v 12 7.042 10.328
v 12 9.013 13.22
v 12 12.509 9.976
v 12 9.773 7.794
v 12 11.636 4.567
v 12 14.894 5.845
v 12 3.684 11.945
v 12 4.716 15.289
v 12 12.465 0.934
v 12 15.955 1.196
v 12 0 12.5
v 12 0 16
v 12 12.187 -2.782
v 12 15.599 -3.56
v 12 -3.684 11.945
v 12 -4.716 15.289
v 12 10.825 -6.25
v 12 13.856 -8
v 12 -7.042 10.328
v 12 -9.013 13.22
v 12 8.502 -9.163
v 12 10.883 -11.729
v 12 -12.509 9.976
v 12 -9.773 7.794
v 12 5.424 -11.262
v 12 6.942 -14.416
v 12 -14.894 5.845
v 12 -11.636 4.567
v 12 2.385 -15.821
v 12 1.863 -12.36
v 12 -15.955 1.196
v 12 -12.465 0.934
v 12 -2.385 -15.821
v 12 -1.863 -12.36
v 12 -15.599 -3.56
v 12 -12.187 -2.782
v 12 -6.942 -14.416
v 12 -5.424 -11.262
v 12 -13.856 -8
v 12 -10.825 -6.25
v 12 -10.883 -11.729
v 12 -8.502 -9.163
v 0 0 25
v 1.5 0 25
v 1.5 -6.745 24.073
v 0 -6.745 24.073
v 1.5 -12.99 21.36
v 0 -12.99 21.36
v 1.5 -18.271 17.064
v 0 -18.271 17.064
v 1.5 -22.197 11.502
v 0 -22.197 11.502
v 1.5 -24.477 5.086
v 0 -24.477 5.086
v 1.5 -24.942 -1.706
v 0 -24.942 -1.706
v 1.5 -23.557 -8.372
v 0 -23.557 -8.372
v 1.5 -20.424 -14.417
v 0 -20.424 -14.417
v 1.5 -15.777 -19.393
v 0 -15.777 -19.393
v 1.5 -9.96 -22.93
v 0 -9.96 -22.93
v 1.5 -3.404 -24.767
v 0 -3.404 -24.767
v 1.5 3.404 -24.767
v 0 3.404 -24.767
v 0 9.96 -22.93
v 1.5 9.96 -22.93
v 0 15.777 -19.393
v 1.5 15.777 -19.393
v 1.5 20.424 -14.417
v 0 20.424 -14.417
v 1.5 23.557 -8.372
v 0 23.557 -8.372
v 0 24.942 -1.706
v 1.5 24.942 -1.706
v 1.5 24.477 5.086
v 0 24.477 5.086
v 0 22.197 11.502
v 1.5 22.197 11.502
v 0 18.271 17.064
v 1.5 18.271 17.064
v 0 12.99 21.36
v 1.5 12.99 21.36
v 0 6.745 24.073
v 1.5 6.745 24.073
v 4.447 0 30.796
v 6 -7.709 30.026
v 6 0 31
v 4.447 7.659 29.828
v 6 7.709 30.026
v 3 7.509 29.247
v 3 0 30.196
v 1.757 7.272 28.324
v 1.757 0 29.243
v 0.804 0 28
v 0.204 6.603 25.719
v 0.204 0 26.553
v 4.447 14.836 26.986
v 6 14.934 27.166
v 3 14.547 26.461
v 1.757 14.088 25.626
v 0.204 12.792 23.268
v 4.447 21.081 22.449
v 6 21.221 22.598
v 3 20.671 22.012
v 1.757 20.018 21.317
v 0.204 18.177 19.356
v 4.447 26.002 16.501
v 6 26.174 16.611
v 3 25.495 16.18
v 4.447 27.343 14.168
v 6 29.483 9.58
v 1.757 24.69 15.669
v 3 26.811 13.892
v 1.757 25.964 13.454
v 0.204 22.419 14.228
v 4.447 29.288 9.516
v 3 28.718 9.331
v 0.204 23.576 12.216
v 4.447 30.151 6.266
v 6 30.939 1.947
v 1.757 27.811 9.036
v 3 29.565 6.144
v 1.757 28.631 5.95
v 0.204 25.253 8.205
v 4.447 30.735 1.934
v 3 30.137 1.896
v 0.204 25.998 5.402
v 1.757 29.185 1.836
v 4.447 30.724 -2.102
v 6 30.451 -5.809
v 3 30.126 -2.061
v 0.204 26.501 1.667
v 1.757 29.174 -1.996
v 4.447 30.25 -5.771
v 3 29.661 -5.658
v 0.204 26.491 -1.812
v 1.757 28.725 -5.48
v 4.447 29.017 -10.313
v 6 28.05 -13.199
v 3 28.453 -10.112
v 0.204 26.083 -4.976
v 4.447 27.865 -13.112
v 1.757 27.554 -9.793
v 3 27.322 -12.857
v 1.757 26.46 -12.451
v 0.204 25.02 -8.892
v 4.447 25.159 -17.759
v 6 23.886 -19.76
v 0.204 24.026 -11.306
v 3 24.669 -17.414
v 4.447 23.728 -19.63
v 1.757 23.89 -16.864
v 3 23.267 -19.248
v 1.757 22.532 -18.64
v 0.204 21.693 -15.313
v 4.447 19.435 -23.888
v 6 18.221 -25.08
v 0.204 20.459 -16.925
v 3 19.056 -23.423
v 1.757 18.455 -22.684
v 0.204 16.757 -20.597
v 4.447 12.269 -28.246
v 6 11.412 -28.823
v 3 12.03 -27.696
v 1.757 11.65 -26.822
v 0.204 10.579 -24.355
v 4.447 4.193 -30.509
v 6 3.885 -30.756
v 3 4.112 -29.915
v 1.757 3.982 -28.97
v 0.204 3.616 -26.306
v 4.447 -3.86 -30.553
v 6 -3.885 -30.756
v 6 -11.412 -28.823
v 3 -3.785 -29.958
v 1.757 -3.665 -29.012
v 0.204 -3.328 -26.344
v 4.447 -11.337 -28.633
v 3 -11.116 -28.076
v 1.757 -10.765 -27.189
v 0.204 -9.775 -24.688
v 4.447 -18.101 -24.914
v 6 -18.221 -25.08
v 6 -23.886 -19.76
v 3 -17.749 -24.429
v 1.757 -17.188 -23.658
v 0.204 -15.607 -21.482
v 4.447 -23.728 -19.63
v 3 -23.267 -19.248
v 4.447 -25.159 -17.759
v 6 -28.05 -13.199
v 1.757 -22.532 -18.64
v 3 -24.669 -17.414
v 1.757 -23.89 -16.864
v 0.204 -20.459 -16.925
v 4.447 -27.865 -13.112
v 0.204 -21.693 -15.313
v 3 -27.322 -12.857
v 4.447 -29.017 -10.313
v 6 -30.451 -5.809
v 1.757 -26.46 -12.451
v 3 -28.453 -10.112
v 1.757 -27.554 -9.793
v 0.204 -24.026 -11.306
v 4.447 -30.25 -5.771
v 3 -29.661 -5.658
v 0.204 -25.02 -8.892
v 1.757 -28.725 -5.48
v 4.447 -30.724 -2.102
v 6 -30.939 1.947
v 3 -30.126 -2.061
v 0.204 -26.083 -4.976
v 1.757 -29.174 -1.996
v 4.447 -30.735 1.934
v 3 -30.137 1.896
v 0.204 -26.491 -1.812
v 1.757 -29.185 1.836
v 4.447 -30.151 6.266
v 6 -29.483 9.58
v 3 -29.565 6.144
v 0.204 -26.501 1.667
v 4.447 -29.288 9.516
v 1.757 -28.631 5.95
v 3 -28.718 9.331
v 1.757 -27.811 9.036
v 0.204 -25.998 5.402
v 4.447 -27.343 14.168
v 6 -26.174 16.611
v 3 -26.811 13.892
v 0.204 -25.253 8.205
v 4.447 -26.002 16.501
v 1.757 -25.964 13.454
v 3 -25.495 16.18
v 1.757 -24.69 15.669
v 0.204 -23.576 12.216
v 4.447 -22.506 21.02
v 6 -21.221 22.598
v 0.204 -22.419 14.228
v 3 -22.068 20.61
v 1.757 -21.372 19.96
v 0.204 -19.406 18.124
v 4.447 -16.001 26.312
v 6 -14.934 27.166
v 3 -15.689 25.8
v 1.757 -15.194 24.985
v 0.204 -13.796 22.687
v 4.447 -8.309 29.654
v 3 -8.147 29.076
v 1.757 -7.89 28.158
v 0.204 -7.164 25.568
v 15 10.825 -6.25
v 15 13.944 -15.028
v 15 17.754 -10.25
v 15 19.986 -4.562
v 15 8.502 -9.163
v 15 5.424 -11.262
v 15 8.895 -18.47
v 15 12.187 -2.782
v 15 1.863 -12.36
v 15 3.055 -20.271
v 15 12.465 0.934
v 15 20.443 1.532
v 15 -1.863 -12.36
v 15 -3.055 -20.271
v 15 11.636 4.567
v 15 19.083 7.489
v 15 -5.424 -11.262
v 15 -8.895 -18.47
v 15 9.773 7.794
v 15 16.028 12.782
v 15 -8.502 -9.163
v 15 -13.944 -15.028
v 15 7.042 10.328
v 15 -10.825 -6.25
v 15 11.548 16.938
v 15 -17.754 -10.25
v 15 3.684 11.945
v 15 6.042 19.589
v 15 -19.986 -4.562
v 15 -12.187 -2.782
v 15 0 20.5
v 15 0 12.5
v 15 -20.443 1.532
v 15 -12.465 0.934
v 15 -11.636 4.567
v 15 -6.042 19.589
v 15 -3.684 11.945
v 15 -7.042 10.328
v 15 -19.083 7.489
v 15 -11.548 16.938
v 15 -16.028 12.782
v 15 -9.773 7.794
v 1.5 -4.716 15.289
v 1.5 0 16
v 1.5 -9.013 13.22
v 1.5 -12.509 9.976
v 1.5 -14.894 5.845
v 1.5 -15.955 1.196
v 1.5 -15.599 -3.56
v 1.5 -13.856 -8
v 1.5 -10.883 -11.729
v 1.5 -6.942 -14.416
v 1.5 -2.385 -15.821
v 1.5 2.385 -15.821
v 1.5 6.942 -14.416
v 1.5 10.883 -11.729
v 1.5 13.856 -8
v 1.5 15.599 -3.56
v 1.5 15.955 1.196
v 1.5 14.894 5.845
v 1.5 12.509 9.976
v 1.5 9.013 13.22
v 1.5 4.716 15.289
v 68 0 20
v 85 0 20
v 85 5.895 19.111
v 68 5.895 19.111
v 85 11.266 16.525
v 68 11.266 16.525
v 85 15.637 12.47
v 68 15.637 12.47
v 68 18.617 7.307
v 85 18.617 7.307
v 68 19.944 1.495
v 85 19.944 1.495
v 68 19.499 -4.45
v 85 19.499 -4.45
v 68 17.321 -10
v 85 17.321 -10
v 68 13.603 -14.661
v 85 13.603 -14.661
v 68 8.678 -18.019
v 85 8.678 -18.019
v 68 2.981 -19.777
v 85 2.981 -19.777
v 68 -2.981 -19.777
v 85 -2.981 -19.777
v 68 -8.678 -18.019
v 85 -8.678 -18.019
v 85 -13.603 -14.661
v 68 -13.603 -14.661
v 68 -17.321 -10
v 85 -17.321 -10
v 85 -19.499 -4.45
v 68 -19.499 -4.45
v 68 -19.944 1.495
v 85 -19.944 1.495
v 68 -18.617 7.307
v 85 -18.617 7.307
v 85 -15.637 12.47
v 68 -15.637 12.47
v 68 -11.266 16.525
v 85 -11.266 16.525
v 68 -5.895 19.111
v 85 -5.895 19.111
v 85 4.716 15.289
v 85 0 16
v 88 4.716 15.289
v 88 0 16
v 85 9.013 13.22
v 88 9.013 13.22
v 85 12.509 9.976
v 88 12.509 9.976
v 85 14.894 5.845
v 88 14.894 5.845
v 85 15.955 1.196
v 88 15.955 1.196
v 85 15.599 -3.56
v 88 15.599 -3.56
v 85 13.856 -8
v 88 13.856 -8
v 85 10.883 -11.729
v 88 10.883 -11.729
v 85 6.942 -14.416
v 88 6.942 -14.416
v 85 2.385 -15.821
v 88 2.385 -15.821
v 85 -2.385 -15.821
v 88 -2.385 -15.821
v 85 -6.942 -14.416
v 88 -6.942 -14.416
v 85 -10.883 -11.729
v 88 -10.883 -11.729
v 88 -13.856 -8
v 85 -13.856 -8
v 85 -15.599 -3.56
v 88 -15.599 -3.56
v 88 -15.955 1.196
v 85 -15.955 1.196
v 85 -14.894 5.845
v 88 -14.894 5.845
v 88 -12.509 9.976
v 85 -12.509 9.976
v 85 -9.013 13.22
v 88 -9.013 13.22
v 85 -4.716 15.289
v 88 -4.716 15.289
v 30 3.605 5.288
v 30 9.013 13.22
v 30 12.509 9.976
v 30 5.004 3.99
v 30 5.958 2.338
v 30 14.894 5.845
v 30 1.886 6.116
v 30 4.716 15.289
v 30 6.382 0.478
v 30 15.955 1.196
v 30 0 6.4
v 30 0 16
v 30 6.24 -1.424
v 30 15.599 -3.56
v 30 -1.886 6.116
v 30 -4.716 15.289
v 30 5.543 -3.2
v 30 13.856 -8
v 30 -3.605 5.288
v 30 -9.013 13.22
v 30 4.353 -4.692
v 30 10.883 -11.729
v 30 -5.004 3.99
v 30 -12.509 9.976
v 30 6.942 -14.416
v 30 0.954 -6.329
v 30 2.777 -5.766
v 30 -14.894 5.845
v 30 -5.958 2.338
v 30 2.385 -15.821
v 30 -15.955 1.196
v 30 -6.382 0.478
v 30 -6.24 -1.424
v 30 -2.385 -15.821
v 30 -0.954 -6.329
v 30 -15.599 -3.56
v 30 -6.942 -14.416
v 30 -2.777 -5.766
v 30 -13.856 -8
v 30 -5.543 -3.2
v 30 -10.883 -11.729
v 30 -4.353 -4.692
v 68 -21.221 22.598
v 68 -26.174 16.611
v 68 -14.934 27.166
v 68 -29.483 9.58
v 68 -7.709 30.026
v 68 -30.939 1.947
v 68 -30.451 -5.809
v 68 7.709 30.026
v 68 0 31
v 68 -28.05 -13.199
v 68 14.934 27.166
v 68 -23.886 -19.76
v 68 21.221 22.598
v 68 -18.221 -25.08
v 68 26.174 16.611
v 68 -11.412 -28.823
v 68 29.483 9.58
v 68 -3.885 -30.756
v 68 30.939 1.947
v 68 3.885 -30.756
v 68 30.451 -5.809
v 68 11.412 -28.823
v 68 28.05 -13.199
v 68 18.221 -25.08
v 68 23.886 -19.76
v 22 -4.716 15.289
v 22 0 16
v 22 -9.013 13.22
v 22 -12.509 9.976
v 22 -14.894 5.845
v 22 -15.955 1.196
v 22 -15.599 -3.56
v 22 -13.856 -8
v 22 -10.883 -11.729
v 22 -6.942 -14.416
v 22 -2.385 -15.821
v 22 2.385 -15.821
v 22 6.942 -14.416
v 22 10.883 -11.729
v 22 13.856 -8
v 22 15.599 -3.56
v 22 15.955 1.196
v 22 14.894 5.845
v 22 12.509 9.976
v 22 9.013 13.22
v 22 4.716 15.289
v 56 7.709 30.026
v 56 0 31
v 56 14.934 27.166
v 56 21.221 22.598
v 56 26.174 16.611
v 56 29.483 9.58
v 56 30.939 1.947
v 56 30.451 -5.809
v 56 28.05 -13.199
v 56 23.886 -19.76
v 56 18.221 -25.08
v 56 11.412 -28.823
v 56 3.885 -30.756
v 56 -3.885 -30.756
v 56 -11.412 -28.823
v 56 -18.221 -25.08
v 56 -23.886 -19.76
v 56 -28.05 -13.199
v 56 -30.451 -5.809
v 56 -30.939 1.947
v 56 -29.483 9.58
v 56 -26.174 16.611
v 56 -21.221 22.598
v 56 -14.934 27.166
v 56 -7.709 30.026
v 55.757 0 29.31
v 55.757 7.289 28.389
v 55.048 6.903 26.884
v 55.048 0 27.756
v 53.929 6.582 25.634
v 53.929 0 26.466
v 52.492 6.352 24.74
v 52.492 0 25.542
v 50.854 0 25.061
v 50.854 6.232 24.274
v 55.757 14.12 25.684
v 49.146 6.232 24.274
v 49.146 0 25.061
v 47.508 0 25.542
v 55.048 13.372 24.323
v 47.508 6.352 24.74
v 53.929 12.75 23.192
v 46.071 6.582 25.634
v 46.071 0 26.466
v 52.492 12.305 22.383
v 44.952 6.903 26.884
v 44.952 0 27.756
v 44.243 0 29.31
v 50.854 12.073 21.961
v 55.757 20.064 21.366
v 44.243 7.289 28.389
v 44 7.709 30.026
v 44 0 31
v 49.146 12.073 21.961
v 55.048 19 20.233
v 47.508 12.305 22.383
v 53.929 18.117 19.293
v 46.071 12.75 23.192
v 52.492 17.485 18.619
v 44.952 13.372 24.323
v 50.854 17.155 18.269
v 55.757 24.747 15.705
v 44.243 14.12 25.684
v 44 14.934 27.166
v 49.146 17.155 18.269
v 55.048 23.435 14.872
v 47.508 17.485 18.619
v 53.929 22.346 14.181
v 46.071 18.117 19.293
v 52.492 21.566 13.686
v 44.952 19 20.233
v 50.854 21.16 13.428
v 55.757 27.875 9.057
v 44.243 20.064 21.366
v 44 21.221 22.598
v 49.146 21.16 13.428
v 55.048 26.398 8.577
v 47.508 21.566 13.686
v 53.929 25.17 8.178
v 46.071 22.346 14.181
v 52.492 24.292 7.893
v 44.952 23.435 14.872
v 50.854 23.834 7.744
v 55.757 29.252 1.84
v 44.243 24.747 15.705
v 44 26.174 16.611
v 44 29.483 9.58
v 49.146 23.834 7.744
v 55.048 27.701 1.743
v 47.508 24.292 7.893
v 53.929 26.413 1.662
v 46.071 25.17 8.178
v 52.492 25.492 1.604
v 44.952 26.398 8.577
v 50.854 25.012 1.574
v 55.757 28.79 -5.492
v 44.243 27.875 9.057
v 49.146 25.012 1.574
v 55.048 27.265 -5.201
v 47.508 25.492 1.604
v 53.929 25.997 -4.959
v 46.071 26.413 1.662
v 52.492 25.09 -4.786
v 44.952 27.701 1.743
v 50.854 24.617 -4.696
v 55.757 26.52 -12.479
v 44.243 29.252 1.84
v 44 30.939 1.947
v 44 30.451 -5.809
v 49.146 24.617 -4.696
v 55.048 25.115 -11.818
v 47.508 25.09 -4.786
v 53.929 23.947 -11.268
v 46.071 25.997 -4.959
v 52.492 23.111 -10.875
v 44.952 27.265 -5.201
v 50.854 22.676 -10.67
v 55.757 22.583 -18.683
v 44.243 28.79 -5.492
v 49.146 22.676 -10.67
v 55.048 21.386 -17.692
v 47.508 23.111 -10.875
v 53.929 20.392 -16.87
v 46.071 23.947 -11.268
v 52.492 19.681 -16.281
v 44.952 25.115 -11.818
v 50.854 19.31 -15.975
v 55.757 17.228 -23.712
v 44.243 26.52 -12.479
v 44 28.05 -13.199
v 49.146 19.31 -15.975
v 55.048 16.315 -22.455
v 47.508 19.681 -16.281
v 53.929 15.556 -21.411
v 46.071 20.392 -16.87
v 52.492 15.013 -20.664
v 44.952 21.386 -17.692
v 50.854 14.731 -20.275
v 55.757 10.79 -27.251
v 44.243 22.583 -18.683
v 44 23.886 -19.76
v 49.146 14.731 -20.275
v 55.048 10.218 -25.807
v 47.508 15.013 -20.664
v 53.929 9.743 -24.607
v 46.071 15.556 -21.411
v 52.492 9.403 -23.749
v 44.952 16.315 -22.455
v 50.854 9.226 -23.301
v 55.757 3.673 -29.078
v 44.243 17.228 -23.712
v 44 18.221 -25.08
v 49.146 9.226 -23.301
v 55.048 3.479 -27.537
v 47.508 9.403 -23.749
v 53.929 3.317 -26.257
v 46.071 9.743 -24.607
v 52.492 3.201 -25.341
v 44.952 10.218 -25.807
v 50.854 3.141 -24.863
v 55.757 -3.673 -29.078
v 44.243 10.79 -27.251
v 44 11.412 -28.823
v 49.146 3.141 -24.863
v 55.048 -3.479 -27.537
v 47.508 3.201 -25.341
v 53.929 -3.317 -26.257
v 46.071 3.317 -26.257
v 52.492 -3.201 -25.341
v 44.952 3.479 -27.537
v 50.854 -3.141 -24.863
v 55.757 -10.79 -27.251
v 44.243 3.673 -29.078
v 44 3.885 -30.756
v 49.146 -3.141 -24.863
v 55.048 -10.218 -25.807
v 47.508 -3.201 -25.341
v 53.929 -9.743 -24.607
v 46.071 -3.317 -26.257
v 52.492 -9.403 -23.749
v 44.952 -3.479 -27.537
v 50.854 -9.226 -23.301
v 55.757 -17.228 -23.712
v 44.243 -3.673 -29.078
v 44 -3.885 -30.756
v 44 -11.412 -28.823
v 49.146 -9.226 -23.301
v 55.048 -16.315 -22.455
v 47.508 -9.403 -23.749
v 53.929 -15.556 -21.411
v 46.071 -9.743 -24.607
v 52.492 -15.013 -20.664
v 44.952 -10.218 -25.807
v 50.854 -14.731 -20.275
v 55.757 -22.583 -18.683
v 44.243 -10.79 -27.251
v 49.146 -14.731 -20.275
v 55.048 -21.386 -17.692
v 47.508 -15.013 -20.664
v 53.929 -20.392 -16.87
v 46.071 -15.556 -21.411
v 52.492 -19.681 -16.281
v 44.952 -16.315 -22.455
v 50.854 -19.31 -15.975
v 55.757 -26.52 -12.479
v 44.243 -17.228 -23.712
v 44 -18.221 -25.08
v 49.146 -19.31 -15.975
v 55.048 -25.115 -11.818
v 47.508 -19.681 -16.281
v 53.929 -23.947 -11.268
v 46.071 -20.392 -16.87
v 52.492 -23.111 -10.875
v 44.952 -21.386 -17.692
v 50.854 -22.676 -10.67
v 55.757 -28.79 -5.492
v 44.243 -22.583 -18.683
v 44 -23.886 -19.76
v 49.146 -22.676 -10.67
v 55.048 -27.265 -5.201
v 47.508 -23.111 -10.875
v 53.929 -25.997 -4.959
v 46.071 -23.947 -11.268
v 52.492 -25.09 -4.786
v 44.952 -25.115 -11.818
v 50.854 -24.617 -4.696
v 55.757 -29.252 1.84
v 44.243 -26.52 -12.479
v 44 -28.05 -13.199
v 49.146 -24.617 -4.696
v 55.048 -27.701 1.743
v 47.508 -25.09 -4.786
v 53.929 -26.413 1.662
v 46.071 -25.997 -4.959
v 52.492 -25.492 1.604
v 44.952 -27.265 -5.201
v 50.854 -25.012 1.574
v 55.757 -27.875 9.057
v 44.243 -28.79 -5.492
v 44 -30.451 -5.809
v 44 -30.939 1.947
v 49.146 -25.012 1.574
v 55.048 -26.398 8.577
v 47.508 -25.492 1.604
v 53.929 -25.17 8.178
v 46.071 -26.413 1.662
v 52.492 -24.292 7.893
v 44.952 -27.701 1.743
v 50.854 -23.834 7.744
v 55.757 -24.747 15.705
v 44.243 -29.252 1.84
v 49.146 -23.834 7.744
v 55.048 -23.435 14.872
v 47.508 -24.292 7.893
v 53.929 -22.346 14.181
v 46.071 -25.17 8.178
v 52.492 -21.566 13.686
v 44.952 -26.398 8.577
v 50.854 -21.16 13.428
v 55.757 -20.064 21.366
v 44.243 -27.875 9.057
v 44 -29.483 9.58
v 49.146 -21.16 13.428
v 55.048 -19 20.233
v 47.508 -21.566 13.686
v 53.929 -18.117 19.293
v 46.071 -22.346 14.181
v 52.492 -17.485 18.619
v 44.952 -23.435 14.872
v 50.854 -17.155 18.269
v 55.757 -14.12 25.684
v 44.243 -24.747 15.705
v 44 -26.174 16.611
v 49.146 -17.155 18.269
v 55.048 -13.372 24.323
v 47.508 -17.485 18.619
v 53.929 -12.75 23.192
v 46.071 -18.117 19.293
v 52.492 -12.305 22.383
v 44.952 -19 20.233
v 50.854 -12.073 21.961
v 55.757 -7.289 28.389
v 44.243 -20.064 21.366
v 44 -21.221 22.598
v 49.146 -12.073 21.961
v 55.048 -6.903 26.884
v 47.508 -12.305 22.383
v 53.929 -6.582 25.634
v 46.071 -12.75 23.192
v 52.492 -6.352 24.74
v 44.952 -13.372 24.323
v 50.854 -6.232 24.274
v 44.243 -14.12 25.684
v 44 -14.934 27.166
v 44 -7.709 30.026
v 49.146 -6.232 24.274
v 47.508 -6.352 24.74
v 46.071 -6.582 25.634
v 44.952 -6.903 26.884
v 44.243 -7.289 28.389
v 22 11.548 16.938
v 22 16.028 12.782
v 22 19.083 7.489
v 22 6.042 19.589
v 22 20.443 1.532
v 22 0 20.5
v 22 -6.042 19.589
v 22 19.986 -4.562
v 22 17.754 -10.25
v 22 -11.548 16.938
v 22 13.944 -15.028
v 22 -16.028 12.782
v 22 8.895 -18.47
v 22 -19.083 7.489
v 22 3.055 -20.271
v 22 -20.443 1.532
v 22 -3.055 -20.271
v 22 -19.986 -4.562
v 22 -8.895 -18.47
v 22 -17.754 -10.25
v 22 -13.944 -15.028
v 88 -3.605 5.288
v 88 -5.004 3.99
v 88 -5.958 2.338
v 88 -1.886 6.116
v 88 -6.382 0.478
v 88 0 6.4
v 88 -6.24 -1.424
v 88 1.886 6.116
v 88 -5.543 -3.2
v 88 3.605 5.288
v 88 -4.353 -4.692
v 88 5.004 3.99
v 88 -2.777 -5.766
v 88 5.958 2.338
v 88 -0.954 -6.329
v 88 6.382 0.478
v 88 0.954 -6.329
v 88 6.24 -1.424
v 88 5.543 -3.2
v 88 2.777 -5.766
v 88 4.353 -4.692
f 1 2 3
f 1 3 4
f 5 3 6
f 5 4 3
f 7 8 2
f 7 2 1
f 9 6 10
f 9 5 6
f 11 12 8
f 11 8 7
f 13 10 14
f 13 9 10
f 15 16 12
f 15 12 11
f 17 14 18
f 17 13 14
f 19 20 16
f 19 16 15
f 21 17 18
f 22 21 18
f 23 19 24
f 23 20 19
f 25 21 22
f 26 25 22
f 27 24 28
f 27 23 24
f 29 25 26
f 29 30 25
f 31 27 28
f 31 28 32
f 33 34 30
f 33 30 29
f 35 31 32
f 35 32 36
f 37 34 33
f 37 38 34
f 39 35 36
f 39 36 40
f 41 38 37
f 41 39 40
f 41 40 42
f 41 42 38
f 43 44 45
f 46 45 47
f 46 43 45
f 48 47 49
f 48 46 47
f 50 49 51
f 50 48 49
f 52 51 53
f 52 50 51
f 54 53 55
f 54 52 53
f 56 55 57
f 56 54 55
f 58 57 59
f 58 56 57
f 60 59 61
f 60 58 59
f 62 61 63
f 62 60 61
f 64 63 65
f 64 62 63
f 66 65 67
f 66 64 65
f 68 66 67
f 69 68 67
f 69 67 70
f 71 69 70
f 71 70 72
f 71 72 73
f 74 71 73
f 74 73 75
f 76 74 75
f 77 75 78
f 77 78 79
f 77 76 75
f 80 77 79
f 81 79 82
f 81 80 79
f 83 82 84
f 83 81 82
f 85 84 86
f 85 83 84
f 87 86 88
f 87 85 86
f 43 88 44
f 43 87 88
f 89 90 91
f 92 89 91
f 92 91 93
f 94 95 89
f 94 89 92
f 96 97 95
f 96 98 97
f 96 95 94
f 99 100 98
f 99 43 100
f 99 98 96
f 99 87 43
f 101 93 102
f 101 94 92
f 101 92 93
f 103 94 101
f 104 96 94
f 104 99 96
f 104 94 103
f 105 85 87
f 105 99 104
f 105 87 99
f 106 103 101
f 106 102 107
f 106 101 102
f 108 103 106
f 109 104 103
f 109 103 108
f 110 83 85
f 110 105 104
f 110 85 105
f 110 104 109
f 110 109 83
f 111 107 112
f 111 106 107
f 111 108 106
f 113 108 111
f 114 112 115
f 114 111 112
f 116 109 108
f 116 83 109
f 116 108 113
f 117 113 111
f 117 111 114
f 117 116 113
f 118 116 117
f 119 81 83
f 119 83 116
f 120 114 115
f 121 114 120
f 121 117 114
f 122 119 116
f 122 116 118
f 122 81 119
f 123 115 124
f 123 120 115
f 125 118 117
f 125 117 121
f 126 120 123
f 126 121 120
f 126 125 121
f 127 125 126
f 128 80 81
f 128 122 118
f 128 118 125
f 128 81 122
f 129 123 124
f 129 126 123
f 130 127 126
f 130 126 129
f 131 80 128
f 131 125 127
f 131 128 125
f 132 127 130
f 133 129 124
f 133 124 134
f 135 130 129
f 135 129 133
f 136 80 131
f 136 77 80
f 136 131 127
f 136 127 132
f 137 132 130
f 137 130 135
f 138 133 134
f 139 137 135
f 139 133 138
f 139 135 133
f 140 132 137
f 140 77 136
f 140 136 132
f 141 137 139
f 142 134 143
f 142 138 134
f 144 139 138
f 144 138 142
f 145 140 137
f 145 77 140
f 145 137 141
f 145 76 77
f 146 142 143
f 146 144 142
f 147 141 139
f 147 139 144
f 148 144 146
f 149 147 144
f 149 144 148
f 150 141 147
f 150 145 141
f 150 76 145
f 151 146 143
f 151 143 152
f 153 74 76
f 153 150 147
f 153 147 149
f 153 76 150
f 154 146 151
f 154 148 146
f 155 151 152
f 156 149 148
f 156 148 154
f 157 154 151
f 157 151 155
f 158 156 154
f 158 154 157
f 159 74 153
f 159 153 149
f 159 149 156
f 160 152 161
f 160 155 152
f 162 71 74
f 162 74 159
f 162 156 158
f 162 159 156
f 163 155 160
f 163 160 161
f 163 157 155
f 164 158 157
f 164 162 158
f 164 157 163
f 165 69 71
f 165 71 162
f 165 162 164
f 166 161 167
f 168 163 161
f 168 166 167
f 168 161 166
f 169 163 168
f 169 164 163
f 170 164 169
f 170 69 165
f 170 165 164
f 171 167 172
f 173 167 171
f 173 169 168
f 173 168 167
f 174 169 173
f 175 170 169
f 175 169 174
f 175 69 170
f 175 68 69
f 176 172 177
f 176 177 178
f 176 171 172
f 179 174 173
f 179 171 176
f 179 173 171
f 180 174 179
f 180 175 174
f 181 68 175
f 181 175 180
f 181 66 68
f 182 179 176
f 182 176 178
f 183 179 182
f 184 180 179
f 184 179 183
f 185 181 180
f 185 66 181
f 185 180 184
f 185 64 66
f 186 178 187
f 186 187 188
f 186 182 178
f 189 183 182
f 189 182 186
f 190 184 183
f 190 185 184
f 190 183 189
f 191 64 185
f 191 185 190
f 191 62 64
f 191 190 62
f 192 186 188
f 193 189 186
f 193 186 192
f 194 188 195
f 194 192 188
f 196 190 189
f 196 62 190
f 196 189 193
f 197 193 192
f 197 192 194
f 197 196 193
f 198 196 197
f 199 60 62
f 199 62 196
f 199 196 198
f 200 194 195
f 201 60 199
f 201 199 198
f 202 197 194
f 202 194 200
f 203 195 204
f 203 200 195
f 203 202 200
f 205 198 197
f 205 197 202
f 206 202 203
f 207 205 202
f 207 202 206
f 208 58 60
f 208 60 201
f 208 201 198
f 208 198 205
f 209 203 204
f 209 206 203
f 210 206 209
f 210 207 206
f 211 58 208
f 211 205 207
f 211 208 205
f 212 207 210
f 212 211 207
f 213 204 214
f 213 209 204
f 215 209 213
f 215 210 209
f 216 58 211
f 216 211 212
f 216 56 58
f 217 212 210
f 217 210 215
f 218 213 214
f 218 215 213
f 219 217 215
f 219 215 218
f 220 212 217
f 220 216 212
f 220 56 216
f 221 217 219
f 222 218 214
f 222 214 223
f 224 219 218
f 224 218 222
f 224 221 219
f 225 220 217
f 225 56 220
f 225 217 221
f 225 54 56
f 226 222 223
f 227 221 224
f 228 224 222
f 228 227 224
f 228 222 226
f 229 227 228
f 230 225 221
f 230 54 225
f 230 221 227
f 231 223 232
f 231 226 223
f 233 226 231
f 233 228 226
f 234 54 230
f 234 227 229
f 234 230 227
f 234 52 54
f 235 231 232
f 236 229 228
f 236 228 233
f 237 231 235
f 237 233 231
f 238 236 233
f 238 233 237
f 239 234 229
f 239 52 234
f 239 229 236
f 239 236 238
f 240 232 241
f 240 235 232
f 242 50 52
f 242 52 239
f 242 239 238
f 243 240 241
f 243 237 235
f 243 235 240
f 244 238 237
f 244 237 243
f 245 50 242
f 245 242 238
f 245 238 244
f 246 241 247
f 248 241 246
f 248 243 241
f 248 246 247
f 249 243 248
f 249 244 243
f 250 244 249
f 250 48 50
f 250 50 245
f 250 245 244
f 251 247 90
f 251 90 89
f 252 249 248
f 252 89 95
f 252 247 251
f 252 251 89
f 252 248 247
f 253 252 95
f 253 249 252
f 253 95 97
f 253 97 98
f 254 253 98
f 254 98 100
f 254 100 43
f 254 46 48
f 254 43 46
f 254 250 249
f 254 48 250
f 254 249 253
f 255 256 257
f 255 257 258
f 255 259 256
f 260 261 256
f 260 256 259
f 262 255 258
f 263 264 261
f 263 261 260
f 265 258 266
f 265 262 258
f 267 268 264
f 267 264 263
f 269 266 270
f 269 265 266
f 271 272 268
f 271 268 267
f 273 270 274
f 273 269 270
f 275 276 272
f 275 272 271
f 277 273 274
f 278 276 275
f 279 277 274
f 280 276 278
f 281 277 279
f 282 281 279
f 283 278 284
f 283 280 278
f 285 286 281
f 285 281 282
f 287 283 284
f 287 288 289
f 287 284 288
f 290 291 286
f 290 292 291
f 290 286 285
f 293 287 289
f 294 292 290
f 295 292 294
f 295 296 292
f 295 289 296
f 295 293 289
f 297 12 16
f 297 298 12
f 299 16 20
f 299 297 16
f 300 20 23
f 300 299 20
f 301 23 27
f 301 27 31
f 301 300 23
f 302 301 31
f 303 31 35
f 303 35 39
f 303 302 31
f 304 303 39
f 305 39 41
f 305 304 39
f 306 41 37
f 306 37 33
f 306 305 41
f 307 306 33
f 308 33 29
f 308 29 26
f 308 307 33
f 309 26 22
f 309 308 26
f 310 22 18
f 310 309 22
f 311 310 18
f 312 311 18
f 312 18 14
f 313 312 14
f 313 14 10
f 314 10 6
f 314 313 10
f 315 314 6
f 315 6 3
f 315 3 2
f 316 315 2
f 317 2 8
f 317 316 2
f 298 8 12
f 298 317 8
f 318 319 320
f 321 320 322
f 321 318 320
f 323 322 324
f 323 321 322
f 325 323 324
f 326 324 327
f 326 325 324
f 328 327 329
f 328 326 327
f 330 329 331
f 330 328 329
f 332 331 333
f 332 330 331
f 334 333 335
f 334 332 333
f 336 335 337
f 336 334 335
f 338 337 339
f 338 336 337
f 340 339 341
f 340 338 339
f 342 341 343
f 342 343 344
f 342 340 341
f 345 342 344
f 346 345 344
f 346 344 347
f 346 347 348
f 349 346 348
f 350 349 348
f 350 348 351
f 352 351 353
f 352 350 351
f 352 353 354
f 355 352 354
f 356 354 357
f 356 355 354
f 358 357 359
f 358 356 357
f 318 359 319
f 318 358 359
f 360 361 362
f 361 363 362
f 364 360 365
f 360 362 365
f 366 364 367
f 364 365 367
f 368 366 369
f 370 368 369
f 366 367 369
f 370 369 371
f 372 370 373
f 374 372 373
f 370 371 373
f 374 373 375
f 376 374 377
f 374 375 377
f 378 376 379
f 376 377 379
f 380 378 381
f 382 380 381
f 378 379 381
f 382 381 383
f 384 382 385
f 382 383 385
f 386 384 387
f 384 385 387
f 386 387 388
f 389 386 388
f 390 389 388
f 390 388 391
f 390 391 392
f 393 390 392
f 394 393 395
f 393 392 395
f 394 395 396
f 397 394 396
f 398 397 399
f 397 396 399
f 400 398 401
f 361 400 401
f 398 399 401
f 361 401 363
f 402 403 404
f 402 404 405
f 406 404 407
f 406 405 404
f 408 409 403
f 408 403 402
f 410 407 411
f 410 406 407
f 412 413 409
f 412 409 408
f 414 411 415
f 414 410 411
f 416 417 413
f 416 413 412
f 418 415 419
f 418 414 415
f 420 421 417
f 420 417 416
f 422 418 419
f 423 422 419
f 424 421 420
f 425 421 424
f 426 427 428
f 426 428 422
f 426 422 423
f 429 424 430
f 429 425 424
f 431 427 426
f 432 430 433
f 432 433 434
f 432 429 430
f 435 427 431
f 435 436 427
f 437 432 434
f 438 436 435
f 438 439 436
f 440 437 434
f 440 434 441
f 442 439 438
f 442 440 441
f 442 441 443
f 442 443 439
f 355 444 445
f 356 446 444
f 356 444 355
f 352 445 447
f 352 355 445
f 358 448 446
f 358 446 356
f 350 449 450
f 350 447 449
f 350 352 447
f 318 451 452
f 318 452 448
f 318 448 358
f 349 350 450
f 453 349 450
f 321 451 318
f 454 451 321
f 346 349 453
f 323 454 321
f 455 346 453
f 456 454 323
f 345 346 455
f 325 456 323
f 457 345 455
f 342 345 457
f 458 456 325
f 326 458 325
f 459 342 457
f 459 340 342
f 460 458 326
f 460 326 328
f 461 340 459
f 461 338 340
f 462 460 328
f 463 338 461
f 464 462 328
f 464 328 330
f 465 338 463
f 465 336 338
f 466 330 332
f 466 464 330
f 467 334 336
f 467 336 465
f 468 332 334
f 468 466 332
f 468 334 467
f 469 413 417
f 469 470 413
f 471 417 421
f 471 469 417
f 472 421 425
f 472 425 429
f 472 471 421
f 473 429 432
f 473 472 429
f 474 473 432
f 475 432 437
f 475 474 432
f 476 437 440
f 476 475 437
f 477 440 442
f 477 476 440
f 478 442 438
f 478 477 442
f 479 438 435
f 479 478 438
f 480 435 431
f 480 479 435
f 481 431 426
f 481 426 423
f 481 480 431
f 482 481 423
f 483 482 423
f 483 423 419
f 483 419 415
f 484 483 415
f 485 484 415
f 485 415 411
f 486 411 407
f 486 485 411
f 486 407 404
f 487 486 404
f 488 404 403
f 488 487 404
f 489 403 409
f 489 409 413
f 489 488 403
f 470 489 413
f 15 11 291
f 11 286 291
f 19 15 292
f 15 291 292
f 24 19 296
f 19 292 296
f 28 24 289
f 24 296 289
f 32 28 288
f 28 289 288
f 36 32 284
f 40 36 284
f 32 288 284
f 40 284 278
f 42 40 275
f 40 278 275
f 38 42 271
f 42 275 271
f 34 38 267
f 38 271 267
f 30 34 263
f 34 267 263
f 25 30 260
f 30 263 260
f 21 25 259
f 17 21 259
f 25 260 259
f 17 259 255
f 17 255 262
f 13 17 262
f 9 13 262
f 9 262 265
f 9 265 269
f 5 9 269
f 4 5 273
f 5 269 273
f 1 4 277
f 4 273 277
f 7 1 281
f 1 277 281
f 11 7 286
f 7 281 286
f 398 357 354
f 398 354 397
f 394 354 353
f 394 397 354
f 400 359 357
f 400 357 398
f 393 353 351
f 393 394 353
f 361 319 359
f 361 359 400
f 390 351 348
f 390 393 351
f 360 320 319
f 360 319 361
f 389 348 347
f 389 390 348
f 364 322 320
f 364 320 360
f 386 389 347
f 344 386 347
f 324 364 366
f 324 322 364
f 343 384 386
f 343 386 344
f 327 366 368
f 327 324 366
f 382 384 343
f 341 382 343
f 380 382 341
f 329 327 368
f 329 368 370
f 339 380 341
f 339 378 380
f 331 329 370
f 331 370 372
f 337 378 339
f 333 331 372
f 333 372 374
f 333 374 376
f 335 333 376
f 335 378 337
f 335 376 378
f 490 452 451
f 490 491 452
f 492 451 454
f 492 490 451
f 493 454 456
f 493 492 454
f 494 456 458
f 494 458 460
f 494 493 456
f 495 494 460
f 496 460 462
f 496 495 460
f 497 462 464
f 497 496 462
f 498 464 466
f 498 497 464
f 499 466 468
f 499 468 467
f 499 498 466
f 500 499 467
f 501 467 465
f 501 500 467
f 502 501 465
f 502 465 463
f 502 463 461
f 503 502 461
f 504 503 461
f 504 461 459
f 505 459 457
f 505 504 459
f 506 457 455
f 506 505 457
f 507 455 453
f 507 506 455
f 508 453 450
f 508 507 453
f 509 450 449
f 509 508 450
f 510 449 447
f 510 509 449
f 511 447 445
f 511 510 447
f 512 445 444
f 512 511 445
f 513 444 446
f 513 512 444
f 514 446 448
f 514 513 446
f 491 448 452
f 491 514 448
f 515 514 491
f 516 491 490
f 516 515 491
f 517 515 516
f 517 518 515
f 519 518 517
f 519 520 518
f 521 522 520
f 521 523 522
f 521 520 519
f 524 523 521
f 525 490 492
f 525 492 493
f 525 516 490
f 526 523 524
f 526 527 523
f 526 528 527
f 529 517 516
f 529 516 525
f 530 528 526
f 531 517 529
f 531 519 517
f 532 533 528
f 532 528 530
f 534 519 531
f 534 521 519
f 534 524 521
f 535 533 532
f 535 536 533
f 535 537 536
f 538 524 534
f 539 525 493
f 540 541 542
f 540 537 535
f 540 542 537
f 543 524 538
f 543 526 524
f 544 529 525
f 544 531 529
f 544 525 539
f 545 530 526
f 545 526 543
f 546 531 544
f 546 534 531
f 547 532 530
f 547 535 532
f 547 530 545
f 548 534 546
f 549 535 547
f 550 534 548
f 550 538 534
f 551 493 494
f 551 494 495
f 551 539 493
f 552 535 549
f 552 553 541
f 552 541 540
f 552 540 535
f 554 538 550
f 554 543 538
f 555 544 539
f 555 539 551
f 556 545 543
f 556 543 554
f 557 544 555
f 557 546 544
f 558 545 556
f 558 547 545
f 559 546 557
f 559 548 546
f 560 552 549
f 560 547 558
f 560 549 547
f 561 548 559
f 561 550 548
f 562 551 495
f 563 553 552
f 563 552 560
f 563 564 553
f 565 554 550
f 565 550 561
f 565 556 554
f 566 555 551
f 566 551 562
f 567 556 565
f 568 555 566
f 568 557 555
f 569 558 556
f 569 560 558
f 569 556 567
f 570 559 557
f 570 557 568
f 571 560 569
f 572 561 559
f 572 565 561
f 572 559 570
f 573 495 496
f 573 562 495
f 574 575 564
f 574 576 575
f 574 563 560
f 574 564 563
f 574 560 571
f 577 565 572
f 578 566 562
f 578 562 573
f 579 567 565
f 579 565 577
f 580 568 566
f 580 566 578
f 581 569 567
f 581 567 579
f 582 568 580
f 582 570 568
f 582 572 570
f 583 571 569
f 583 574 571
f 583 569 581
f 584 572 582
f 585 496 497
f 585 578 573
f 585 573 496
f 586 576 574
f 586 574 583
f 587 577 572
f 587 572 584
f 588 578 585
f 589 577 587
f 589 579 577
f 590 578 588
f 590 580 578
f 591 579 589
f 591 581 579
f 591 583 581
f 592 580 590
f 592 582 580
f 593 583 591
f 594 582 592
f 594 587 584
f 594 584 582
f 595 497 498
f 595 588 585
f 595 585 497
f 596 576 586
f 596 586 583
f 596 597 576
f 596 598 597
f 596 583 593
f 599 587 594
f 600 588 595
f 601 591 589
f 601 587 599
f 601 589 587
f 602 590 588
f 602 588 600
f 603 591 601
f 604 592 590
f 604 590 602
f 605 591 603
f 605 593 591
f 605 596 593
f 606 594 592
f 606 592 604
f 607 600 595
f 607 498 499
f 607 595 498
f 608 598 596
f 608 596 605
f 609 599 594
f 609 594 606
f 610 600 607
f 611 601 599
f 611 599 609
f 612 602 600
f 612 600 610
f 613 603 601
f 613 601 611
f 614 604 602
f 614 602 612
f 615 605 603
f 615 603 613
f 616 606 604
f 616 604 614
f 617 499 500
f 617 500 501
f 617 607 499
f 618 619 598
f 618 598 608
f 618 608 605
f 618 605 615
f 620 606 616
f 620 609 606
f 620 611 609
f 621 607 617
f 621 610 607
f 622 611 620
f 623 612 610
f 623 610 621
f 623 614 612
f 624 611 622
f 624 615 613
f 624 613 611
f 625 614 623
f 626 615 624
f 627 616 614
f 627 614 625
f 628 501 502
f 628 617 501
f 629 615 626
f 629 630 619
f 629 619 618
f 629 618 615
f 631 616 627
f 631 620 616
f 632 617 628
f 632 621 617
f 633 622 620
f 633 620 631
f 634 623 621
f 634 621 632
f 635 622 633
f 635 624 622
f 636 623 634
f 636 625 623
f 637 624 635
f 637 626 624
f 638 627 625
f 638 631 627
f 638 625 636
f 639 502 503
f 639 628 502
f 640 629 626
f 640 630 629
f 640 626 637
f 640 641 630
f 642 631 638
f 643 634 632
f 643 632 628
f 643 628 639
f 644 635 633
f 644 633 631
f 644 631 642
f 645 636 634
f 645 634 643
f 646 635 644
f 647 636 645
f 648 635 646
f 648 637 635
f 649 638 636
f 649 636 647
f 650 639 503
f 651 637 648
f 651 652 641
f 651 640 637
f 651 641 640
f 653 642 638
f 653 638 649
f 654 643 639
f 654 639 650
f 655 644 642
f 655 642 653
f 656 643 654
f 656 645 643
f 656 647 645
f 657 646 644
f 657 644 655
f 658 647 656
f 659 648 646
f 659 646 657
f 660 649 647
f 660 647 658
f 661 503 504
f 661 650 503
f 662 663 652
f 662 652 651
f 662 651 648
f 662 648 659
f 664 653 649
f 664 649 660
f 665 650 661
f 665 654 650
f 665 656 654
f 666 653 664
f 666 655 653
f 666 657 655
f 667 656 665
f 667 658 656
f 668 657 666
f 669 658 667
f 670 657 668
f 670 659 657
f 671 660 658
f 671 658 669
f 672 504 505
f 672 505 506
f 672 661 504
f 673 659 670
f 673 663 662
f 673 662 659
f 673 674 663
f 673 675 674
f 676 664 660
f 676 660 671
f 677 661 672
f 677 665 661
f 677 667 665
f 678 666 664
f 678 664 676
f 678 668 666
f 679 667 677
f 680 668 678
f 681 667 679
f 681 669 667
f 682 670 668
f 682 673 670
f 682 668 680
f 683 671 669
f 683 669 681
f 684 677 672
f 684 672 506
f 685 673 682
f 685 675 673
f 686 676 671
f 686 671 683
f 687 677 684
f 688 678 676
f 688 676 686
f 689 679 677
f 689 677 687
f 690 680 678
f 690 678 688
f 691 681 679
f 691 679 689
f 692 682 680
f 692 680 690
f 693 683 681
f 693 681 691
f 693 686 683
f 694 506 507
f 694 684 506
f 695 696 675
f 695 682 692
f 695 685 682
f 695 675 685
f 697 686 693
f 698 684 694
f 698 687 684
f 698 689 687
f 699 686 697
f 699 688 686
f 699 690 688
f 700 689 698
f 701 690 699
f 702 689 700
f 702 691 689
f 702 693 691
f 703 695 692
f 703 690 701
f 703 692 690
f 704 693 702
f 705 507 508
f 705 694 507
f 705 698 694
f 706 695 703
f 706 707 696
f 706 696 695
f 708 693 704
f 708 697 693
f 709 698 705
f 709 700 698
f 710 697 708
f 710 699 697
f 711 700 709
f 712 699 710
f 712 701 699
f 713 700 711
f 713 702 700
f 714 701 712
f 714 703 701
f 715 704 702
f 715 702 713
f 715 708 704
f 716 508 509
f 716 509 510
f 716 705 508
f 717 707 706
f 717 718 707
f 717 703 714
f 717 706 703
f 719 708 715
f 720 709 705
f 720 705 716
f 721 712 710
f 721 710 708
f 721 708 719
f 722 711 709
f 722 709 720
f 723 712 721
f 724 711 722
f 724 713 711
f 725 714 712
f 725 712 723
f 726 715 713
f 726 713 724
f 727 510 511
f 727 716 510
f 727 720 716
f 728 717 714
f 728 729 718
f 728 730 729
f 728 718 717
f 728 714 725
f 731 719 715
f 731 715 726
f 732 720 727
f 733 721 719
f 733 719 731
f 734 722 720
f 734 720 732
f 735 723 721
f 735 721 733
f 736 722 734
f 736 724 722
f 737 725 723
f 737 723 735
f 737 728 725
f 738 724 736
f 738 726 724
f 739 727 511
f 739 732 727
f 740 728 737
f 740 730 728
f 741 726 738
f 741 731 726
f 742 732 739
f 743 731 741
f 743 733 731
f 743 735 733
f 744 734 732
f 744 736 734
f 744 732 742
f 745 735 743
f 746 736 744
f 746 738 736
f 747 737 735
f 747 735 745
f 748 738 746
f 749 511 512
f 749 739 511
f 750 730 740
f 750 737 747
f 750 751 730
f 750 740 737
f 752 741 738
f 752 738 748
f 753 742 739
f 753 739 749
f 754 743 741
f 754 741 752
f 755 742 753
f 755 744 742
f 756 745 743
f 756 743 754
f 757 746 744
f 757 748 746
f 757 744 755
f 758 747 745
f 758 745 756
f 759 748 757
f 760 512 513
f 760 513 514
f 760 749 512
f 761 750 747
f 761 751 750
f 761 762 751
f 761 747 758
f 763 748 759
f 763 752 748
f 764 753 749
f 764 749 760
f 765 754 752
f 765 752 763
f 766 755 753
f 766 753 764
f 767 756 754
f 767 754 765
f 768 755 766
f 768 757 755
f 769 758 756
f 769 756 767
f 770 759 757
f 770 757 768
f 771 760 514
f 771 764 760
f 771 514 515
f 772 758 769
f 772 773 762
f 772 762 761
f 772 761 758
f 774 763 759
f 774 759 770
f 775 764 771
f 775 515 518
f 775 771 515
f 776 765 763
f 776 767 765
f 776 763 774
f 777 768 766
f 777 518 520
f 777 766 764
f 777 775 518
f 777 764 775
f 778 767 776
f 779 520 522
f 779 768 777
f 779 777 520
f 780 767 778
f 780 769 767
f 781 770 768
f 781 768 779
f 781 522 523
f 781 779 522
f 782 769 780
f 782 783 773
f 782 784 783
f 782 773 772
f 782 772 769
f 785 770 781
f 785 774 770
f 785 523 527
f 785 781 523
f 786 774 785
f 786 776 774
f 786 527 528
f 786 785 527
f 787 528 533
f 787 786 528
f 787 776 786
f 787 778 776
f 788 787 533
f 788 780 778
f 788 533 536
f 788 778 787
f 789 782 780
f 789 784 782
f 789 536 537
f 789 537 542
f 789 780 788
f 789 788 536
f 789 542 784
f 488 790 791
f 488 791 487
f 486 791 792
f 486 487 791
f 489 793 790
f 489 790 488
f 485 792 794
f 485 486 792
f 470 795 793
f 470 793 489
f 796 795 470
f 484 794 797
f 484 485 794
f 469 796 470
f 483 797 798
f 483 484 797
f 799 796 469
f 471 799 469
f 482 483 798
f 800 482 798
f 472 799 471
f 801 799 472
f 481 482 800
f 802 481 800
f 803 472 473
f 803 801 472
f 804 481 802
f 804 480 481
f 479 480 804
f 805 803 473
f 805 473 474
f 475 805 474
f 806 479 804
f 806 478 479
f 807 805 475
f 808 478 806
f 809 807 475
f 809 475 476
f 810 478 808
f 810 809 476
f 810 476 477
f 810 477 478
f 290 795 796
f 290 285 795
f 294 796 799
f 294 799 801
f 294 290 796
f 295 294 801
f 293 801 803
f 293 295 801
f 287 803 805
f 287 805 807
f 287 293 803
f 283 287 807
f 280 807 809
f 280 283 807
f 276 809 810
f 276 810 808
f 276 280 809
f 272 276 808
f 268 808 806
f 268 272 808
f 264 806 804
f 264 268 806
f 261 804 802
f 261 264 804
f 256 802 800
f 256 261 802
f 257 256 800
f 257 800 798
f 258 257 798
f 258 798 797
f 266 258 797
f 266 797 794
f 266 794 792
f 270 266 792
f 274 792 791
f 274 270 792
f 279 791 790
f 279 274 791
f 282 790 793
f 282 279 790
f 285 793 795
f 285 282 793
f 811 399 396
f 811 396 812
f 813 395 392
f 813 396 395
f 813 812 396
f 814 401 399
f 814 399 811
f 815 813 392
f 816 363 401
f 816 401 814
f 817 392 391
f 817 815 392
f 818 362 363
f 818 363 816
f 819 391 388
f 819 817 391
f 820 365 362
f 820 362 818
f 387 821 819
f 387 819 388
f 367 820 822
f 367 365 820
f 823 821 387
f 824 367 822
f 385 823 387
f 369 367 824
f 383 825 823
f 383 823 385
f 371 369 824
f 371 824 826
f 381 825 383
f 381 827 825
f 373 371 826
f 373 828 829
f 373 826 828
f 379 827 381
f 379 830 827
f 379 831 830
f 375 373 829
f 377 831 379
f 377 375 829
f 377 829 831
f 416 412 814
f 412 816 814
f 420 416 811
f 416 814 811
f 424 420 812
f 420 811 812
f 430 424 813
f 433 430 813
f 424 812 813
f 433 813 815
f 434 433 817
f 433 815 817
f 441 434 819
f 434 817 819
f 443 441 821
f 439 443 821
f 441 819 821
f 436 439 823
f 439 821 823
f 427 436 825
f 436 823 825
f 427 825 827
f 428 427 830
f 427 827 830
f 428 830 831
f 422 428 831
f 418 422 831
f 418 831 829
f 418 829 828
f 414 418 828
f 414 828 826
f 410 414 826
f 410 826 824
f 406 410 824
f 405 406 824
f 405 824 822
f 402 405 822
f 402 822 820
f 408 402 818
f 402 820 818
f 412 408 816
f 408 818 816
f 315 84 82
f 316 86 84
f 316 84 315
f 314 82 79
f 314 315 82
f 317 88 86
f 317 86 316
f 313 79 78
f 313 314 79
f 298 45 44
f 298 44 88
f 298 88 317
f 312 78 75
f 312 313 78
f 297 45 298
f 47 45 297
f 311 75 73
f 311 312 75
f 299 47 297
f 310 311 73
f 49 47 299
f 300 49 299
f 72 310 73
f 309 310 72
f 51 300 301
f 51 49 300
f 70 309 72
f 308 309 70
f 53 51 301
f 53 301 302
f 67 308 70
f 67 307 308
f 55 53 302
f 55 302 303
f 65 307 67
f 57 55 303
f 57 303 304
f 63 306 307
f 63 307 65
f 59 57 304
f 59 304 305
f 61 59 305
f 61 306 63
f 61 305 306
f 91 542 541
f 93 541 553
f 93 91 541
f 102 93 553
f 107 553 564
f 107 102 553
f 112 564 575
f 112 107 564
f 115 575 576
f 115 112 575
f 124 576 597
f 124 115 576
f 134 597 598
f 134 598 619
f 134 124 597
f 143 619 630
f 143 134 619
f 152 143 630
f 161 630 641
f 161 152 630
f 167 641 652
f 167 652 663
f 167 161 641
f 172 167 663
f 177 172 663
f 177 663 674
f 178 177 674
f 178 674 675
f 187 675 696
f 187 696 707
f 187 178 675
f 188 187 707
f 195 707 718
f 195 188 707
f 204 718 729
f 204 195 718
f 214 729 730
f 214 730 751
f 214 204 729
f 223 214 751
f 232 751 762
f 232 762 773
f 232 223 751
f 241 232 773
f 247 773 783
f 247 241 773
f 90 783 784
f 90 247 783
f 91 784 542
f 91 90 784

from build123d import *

# Parameters (mm, degrees)
F0_W   = 3
F0_H   = 16
F2_W   = 58
F2_H   = 6.4001772553
F2_W_2 = 3
F2_H_2 = 12.5


with BuildPart() as f1:
    # F0 (on Front) → F1 (revolve)
    with BuildSketch(Plane.XZ):
        with BuildLine():
            Line((0, 0), (44, 0))
            Line((44, 0), (44, 31))
            Line((44, 31), (6, 31))
            ThreePointArc((6, 31), (1.7573593129, 29.2426406871), (0, 25))
            Line((0, 25), (0, 0))
        make_face()
        with BuildLine():
            Line((44, 0), (56, 0))
            Line((56, 0), (56, 31))
            ThreePointArc((56, 31), (50, 25), (44, 31))
            Line((44, 31), (44, 0))
        make_face()
        Polygon((56, 0), (68, 0), (68, 20), (68, 31), (56, 31), align=None)
        Polygon((68, 0), (85, 0), (85, 16), (85, 20), (68, 20), align=None)
        with Locations((86.5, 8)):
            Rectangle(F0_W, F0_H)
    revolve(axis=Axis((28, 0, 0), (-1, 0, 0)))

    # F2 (on Front) → F3 (revolve, cut)
    with BuildSketch(Plane.XZ):
        with Locations((59, 3.2000886276)):
            Rectangle(F2_W, F2_H)
        Polygon((22, 0), (30, 0), (30, 6.4001772553), (30, 16), (22, 16), align=None)
        Polygon((15, 0), (22, 0), (22, 16), (22, 20.5), (15, 20.5), (15, 12.5), align=None)
        with Locations((13.5, 6.25)):
            Rectangle(F2_W_2, F2_H_2)
        Polygon((1.5, 0), (12, 0), (12, 12.5), (12, 16), (1.5, 16), align=None)
        Polygon((0, 0), (1.5, 0), (1.5, 16), (1.5, 25), (0, 25), align=None)
    revolve(axis=Axis((74.5795071125, 0, 0), (1, 0, 0)), mode=Mode.SUBTRACT)


solid = f1.part
